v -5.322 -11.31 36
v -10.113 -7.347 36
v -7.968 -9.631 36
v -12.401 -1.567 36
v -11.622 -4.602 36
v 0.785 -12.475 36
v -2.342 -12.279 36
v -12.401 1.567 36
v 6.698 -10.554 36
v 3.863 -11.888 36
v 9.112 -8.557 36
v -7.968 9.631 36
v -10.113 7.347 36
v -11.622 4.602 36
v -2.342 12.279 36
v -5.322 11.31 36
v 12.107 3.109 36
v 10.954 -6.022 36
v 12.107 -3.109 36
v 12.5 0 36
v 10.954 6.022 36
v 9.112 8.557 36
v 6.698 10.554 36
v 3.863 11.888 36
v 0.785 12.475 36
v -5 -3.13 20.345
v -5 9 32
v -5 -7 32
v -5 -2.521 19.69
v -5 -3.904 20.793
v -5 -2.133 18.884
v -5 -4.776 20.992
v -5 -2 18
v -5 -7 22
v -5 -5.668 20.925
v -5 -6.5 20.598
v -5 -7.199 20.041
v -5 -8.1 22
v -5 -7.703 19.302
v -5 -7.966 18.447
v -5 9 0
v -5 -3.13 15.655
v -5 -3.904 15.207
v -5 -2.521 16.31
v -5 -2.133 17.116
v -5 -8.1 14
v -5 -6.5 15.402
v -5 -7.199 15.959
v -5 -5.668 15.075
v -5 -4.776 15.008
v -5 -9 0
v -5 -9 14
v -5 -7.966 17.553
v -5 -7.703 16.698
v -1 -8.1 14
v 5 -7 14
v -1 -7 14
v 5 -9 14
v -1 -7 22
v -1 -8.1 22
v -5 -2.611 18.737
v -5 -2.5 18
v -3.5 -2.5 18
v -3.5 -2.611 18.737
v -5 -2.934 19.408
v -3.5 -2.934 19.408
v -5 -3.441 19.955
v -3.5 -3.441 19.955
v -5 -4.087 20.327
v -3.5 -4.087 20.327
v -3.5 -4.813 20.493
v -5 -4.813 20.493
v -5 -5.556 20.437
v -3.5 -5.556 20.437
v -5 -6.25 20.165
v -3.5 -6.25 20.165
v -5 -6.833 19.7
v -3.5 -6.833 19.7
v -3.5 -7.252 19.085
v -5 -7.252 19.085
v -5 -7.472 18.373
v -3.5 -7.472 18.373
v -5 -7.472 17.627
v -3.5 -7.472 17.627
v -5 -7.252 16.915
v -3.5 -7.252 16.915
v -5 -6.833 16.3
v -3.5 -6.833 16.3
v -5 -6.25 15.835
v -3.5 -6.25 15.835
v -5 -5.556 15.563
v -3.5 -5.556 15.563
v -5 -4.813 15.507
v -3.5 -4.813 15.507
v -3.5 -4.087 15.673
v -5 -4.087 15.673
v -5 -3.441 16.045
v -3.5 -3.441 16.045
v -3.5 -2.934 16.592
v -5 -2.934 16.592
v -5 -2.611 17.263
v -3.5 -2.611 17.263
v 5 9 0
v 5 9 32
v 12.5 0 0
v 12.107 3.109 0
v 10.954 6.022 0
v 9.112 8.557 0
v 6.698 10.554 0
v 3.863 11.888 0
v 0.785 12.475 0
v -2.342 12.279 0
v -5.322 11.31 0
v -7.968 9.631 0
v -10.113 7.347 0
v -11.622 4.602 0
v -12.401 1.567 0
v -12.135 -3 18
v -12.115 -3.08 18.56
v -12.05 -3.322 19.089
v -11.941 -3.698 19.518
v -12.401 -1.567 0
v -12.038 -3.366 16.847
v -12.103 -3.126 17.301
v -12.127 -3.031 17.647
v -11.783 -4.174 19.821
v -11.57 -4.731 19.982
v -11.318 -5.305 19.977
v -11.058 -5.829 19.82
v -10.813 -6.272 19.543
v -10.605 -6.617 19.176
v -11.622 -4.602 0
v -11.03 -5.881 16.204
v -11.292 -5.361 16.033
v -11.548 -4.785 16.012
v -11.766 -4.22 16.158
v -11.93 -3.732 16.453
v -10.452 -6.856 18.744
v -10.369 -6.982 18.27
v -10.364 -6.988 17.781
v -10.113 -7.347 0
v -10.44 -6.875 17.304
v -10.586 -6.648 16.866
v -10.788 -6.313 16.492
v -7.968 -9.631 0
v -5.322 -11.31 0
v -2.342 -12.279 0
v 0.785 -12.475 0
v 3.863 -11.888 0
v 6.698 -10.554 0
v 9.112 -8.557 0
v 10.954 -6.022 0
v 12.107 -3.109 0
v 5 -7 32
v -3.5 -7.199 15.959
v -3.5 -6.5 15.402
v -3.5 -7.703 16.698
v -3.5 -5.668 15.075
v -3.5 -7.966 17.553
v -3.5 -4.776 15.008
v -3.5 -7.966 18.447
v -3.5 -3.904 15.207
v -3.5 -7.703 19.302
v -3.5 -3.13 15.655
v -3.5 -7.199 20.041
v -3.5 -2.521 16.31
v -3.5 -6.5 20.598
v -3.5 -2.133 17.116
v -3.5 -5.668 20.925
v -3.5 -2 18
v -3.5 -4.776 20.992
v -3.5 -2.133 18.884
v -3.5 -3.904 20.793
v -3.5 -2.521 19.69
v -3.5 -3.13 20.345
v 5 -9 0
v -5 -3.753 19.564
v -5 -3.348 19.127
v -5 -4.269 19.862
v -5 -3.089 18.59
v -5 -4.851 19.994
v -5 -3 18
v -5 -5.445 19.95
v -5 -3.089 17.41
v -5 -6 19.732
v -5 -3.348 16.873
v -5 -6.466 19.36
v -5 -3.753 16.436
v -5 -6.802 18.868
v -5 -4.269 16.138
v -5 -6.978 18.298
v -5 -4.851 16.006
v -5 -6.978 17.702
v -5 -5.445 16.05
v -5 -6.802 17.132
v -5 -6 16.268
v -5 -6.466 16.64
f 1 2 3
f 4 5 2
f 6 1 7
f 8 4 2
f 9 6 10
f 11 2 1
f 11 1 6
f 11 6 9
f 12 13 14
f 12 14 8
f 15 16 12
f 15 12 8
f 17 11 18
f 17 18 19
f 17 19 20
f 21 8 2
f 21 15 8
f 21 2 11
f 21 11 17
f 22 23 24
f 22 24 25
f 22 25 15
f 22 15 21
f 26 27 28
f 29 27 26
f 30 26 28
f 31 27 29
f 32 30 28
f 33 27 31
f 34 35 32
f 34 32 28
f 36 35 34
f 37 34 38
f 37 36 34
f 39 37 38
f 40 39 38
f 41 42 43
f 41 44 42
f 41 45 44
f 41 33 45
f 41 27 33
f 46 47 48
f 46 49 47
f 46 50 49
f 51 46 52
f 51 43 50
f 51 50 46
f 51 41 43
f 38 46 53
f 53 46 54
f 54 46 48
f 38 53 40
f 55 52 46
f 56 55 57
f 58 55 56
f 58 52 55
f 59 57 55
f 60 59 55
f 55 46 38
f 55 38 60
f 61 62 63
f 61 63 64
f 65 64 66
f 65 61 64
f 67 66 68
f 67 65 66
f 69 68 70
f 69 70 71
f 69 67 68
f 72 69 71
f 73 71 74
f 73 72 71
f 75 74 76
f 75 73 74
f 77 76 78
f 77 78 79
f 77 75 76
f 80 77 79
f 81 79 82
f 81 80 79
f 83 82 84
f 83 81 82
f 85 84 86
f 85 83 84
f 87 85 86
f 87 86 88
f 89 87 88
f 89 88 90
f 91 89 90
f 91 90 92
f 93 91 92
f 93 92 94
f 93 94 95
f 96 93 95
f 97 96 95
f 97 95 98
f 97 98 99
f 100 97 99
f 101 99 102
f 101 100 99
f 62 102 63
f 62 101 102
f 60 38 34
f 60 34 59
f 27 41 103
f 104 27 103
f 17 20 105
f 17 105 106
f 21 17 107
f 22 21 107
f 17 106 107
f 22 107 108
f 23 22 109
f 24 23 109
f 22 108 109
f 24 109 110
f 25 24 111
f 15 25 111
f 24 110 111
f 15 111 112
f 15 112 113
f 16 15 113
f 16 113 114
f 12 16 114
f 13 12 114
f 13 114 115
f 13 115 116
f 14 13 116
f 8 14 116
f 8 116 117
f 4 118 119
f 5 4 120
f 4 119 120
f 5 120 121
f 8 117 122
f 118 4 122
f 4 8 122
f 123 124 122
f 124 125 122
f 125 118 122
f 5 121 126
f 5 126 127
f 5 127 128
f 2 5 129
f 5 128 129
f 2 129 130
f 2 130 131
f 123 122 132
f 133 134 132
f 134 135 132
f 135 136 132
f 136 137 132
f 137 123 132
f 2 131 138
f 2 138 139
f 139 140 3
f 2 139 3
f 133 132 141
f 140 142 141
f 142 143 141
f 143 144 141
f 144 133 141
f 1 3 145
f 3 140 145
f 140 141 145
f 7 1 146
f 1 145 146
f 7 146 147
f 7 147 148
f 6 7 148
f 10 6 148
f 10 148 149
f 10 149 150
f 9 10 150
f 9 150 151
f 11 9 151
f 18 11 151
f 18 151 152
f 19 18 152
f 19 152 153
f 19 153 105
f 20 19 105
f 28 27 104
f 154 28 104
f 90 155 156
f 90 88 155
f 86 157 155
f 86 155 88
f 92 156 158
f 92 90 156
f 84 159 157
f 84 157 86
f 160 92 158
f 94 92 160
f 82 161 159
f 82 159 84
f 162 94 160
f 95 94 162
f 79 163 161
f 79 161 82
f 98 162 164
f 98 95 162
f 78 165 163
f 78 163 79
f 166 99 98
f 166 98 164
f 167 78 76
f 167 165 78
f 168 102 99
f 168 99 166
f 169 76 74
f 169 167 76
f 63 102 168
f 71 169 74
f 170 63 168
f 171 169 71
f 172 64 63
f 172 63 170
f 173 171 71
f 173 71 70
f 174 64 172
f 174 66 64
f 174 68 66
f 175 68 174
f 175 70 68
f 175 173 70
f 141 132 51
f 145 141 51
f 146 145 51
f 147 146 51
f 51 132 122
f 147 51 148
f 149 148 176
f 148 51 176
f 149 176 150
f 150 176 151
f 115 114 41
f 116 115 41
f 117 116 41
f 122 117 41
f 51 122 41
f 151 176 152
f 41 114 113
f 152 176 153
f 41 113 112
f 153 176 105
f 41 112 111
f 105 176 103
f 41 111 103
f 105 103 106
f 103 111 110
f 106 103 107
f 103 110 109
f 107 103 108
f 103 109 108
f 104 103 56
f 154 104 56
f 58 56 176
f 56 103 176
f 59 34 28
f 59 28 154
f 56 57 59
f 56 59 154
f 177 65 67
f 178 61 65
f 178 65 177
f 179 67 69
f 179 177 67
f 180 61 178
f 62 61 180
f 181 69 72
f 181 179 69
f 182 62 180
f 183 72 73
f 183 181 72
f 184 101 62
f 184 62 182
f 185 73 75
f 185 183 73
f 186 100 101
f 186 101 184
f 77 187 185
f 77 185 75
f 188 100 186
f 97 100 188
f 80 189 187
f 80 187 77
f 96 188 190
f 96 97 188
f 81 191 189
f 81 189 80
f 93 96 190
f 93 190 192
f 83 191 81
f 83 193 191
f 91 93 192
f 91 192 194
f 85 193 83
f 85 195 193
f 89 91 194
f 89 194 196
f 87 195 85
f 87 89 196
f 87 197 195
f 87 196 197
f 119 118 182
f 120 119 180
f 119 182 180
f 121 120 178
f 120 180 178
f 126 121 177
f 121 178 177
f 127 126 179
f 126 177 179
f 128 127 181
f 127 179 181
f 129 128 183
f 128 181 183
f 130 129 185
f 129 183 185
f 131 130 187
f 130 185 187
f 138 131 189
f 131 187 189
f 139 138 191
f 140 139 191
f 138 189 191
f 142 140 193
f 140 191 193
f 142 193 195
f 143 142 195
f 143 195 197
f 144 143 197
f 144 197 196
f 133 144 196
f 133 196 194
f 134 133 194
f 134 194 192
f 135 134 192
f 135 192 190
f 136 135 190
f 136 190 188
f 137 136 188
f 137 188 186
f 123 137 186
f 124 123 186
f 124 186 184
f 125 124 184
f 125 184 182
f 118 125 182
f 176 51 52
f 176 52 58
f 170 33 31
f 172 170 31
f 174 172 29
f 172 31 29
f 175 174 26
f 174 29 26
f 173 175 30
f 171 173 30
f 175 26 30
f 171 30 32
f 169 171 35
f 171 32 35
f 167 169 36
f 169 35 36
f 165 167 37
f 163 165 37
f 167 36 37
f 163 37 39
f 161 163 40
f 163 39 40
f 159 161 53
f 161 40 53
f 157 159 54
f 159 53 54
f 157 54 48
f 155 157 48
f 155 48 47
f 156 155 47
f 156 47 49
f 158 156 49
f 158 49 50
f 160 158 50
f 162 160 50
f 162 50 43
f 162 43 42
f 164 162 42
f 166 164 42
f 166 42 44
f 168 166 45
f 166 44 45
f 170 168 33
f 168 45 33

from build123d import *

# Parameters (mm, degrees)
F0_R      = 12.5
F1_DEPTH  = 36
F2_W      = 10
F2_H      = 16
F3_DEPTH  = 32
F4_W      = 10
F4_H      = 2
F5_DEPTH  = 14
F7_D      = 4
F7_DEPTH  = 7.501
F9_W      = 4
F9_H      = 1.1
F10_DEPTH = 8
F8_R      = 3
F8_R_2    = 2.5
F11_DEPTH = 1.5


with BuildPart() as f1:
    # F0 (on Top) → F1 (new body)
    with BuildSketch(Plane.XY):
        Circle(F0_R)
    extrude(amount=F1_DEPTH)

    # F2 (on face) → F3 (cut)
    with BuildSketch(Plane(origin=(0, 0, 0), x_dir=(1, 0, 0), z_dir=(0, 0, -1))):
        with Locations((0, -1)):
            Rectangle(F2_W, F2_H)
    extrude(amount=-F3_DEPTH, mode=Mode.SUBTRACT)

    # F4 (on face) → F5 (cut)
    with BuildSketch(Plane(origin=(0, 0, 0), x_dir=(1, 0, 0), z_dir=(0, 0, -1))):
        with Locations((0, 8)):
            Rectangle(F4_W, F4_H)
    extrude(amount=-F5_DEPTH, mode=Mode.SUBTRACT)

    # F7 (through all, one way)
    with BuildSketch(Plane.YZ.offset(-5)):
        with Locations((-5, 18)):
            Circle(F7_D / 2)
    extrude(amount=-F7_DEPTH, mode=Mode.SUBTRACT)

    # F9 (on face) → F10 (cut)
    with BuildSketch(Plane(origin=(0, 0, 14), x_dir=(1, 0, 0), z_dir=(0, 0, -1))):
        with Locations((-3, 7.55)):
            Rectangle(F9_W, F9_H)
    extrude(amount=-F10_DEPTH, mode=Mode.SUBTRACT)

    # F8 (on face) → F11 (join)
    with BuildSketch(Plane.YZ.offset(-5)):
        with Locations((-5, 18)):
            Circle(F8_R)
        with Locations((-5, 18)):
            Circle(F8_R_2, mode=Mode.SUBTRACT)
    extrude(amount=F11_DEPTH)


solid = f1.part
